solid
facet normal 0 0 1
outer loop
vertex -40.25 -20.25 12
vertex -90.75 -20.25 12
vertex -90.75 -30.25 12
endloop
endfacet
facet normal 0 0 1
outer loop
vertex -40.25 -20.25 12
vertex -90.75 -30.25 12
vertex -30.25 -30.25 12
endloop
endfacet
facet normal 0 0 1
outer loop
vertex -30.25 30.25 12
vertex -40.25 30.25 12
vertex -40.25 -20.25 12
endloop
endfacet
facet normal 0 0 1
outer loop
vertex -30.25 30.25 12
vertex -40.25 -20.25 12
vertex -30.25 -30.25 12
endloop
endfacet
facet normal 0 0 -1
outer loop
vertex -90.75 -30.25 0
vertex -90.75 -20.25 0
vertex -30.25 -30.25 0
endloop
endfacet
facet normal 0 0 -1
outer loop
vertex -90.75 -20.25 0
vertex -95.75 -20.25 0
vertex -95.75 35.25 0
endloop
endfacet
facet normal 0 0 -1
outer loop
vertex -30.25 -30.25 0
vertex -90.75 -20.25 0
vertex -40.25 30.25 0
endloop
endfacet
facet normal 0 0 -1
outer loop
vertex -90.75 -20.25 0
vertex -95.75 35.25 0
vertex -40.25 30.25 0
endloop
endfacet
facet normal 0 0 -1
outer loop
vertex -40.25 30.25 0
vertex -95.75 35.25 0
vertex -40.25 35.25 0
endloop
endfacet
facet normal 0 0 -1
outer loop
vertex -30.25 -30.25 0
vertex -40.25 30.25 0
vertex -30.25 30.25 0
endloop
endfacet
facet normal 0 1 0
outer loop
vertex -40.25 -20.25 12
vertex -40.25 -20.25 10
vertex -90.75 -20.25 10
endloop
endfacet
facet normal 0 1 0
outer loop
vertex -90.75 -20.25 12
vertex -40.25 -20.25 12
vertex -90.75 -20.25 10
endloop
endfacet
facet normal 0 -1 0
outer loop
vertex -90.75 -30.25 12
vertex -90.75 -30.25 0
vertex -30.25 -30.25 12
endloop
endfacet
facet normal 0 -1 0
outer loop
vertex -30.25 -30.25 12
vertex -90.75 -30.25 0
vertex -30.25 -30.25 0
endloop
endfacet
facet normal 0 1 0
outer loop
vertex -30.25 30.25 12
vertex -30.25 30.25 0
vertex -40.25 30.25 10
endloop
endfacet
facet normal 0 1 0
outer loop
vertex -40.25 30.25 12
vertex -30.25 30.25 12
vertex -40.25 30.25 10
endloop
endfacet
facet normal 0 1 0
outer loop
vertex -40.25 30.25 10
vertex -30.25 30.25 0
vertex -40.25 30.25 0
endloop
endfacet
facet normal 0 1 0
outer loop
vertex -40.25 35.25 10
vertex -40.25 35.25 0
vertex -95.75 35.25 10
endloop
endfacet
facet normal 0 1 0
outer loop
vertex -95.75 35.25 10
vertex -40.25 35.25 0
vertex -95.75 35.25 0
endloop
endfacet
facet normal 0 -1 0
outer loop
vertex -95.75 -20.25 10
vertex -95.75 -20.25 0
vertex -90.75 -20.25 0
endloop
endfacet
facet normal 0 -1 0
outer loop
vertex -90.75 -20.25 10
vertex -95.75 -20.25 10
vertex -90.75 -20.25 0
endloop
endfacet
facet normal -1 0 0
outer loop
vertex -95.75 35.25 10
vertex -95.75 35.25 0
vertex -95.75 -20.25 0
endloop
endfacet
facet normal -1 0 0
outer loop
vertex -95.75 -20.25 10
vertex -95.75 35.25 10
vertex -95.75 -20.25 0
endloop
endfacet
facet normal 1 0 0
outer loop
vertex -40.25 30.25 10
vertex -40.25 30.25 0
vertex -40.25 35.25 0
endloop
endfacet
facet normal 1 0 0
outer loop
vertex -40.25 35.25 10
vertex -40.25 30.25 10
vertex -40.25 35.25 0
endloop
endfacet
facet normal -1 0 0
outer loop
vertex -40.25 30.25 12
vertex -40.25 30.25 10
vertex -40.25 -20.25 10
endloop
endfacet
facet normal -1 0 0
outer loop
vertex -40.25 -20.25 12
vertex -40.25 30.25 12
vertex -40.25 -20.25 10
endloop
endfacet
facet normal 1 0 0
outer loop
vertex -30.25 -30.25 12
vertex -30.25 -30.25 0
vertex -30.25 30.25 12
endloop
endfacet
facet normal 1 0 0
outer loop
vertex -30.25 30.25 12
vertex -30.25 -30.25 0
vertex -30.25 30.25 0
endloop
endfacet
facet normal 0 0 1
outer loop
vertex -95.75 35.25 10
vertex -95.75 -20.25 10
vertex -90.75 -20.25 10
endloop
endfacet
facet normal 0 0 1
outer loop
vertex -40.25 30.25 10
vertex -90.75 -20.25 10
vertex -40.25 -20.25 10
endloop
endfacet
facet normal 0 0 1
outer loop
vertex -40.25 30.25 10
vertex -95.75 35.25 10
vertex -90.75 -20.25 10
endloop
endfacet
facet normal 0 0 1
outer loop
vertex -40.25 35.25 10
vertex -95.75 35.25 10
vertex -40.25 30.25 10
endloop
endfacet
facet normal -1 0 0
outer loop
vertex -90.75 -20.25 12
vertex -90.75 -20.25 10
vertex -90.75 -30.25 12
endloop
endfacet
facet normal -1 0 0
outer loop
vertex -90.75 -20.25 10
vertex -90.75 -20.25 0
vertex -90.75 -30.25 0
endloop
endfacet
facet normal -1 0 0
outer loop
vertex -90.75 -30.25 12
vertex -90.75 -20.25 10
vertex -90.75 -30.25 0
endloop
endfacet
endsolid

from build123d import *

# Parameters (mm, degrees)
F1_DEPTH = 12
F2_DEPTH = 10


with BuildPart() as f1:
    # F0 (on Top) → F1 (new body)
    with BuildSketch(Plane.XY):
        Polygon((-57.75, -20.25), (-90.75, -20.25), (-90.75, -30.25), (-30.25, -30.25), (-30.25, 30.25), (-40.25, 30.25), (-40.25, -2.5), (-40.25, -20.25), align=None)
    extrude(amount=F1_DEPTH)

    # F0 (on Top) → F2 (join)
    with BuildSketch(Plane.XY):
        Polygon((-90.75, -20.25), (-90.75, 30.25), (-40.25, 30.25), (-40.25, 35.2500006557), (-95.75, 35.2500006557), (-95.75, -20.25), align=None)
        Polygon((-40.25, 30.25), (-90.75, 30.25), (-90.75, -20.25), (-57.75, -20.25), (-40.25, -20.25), (-40.25, -2.5), align=None)
    extrude(amount=F2_DEPTH)


solid = f1.part
